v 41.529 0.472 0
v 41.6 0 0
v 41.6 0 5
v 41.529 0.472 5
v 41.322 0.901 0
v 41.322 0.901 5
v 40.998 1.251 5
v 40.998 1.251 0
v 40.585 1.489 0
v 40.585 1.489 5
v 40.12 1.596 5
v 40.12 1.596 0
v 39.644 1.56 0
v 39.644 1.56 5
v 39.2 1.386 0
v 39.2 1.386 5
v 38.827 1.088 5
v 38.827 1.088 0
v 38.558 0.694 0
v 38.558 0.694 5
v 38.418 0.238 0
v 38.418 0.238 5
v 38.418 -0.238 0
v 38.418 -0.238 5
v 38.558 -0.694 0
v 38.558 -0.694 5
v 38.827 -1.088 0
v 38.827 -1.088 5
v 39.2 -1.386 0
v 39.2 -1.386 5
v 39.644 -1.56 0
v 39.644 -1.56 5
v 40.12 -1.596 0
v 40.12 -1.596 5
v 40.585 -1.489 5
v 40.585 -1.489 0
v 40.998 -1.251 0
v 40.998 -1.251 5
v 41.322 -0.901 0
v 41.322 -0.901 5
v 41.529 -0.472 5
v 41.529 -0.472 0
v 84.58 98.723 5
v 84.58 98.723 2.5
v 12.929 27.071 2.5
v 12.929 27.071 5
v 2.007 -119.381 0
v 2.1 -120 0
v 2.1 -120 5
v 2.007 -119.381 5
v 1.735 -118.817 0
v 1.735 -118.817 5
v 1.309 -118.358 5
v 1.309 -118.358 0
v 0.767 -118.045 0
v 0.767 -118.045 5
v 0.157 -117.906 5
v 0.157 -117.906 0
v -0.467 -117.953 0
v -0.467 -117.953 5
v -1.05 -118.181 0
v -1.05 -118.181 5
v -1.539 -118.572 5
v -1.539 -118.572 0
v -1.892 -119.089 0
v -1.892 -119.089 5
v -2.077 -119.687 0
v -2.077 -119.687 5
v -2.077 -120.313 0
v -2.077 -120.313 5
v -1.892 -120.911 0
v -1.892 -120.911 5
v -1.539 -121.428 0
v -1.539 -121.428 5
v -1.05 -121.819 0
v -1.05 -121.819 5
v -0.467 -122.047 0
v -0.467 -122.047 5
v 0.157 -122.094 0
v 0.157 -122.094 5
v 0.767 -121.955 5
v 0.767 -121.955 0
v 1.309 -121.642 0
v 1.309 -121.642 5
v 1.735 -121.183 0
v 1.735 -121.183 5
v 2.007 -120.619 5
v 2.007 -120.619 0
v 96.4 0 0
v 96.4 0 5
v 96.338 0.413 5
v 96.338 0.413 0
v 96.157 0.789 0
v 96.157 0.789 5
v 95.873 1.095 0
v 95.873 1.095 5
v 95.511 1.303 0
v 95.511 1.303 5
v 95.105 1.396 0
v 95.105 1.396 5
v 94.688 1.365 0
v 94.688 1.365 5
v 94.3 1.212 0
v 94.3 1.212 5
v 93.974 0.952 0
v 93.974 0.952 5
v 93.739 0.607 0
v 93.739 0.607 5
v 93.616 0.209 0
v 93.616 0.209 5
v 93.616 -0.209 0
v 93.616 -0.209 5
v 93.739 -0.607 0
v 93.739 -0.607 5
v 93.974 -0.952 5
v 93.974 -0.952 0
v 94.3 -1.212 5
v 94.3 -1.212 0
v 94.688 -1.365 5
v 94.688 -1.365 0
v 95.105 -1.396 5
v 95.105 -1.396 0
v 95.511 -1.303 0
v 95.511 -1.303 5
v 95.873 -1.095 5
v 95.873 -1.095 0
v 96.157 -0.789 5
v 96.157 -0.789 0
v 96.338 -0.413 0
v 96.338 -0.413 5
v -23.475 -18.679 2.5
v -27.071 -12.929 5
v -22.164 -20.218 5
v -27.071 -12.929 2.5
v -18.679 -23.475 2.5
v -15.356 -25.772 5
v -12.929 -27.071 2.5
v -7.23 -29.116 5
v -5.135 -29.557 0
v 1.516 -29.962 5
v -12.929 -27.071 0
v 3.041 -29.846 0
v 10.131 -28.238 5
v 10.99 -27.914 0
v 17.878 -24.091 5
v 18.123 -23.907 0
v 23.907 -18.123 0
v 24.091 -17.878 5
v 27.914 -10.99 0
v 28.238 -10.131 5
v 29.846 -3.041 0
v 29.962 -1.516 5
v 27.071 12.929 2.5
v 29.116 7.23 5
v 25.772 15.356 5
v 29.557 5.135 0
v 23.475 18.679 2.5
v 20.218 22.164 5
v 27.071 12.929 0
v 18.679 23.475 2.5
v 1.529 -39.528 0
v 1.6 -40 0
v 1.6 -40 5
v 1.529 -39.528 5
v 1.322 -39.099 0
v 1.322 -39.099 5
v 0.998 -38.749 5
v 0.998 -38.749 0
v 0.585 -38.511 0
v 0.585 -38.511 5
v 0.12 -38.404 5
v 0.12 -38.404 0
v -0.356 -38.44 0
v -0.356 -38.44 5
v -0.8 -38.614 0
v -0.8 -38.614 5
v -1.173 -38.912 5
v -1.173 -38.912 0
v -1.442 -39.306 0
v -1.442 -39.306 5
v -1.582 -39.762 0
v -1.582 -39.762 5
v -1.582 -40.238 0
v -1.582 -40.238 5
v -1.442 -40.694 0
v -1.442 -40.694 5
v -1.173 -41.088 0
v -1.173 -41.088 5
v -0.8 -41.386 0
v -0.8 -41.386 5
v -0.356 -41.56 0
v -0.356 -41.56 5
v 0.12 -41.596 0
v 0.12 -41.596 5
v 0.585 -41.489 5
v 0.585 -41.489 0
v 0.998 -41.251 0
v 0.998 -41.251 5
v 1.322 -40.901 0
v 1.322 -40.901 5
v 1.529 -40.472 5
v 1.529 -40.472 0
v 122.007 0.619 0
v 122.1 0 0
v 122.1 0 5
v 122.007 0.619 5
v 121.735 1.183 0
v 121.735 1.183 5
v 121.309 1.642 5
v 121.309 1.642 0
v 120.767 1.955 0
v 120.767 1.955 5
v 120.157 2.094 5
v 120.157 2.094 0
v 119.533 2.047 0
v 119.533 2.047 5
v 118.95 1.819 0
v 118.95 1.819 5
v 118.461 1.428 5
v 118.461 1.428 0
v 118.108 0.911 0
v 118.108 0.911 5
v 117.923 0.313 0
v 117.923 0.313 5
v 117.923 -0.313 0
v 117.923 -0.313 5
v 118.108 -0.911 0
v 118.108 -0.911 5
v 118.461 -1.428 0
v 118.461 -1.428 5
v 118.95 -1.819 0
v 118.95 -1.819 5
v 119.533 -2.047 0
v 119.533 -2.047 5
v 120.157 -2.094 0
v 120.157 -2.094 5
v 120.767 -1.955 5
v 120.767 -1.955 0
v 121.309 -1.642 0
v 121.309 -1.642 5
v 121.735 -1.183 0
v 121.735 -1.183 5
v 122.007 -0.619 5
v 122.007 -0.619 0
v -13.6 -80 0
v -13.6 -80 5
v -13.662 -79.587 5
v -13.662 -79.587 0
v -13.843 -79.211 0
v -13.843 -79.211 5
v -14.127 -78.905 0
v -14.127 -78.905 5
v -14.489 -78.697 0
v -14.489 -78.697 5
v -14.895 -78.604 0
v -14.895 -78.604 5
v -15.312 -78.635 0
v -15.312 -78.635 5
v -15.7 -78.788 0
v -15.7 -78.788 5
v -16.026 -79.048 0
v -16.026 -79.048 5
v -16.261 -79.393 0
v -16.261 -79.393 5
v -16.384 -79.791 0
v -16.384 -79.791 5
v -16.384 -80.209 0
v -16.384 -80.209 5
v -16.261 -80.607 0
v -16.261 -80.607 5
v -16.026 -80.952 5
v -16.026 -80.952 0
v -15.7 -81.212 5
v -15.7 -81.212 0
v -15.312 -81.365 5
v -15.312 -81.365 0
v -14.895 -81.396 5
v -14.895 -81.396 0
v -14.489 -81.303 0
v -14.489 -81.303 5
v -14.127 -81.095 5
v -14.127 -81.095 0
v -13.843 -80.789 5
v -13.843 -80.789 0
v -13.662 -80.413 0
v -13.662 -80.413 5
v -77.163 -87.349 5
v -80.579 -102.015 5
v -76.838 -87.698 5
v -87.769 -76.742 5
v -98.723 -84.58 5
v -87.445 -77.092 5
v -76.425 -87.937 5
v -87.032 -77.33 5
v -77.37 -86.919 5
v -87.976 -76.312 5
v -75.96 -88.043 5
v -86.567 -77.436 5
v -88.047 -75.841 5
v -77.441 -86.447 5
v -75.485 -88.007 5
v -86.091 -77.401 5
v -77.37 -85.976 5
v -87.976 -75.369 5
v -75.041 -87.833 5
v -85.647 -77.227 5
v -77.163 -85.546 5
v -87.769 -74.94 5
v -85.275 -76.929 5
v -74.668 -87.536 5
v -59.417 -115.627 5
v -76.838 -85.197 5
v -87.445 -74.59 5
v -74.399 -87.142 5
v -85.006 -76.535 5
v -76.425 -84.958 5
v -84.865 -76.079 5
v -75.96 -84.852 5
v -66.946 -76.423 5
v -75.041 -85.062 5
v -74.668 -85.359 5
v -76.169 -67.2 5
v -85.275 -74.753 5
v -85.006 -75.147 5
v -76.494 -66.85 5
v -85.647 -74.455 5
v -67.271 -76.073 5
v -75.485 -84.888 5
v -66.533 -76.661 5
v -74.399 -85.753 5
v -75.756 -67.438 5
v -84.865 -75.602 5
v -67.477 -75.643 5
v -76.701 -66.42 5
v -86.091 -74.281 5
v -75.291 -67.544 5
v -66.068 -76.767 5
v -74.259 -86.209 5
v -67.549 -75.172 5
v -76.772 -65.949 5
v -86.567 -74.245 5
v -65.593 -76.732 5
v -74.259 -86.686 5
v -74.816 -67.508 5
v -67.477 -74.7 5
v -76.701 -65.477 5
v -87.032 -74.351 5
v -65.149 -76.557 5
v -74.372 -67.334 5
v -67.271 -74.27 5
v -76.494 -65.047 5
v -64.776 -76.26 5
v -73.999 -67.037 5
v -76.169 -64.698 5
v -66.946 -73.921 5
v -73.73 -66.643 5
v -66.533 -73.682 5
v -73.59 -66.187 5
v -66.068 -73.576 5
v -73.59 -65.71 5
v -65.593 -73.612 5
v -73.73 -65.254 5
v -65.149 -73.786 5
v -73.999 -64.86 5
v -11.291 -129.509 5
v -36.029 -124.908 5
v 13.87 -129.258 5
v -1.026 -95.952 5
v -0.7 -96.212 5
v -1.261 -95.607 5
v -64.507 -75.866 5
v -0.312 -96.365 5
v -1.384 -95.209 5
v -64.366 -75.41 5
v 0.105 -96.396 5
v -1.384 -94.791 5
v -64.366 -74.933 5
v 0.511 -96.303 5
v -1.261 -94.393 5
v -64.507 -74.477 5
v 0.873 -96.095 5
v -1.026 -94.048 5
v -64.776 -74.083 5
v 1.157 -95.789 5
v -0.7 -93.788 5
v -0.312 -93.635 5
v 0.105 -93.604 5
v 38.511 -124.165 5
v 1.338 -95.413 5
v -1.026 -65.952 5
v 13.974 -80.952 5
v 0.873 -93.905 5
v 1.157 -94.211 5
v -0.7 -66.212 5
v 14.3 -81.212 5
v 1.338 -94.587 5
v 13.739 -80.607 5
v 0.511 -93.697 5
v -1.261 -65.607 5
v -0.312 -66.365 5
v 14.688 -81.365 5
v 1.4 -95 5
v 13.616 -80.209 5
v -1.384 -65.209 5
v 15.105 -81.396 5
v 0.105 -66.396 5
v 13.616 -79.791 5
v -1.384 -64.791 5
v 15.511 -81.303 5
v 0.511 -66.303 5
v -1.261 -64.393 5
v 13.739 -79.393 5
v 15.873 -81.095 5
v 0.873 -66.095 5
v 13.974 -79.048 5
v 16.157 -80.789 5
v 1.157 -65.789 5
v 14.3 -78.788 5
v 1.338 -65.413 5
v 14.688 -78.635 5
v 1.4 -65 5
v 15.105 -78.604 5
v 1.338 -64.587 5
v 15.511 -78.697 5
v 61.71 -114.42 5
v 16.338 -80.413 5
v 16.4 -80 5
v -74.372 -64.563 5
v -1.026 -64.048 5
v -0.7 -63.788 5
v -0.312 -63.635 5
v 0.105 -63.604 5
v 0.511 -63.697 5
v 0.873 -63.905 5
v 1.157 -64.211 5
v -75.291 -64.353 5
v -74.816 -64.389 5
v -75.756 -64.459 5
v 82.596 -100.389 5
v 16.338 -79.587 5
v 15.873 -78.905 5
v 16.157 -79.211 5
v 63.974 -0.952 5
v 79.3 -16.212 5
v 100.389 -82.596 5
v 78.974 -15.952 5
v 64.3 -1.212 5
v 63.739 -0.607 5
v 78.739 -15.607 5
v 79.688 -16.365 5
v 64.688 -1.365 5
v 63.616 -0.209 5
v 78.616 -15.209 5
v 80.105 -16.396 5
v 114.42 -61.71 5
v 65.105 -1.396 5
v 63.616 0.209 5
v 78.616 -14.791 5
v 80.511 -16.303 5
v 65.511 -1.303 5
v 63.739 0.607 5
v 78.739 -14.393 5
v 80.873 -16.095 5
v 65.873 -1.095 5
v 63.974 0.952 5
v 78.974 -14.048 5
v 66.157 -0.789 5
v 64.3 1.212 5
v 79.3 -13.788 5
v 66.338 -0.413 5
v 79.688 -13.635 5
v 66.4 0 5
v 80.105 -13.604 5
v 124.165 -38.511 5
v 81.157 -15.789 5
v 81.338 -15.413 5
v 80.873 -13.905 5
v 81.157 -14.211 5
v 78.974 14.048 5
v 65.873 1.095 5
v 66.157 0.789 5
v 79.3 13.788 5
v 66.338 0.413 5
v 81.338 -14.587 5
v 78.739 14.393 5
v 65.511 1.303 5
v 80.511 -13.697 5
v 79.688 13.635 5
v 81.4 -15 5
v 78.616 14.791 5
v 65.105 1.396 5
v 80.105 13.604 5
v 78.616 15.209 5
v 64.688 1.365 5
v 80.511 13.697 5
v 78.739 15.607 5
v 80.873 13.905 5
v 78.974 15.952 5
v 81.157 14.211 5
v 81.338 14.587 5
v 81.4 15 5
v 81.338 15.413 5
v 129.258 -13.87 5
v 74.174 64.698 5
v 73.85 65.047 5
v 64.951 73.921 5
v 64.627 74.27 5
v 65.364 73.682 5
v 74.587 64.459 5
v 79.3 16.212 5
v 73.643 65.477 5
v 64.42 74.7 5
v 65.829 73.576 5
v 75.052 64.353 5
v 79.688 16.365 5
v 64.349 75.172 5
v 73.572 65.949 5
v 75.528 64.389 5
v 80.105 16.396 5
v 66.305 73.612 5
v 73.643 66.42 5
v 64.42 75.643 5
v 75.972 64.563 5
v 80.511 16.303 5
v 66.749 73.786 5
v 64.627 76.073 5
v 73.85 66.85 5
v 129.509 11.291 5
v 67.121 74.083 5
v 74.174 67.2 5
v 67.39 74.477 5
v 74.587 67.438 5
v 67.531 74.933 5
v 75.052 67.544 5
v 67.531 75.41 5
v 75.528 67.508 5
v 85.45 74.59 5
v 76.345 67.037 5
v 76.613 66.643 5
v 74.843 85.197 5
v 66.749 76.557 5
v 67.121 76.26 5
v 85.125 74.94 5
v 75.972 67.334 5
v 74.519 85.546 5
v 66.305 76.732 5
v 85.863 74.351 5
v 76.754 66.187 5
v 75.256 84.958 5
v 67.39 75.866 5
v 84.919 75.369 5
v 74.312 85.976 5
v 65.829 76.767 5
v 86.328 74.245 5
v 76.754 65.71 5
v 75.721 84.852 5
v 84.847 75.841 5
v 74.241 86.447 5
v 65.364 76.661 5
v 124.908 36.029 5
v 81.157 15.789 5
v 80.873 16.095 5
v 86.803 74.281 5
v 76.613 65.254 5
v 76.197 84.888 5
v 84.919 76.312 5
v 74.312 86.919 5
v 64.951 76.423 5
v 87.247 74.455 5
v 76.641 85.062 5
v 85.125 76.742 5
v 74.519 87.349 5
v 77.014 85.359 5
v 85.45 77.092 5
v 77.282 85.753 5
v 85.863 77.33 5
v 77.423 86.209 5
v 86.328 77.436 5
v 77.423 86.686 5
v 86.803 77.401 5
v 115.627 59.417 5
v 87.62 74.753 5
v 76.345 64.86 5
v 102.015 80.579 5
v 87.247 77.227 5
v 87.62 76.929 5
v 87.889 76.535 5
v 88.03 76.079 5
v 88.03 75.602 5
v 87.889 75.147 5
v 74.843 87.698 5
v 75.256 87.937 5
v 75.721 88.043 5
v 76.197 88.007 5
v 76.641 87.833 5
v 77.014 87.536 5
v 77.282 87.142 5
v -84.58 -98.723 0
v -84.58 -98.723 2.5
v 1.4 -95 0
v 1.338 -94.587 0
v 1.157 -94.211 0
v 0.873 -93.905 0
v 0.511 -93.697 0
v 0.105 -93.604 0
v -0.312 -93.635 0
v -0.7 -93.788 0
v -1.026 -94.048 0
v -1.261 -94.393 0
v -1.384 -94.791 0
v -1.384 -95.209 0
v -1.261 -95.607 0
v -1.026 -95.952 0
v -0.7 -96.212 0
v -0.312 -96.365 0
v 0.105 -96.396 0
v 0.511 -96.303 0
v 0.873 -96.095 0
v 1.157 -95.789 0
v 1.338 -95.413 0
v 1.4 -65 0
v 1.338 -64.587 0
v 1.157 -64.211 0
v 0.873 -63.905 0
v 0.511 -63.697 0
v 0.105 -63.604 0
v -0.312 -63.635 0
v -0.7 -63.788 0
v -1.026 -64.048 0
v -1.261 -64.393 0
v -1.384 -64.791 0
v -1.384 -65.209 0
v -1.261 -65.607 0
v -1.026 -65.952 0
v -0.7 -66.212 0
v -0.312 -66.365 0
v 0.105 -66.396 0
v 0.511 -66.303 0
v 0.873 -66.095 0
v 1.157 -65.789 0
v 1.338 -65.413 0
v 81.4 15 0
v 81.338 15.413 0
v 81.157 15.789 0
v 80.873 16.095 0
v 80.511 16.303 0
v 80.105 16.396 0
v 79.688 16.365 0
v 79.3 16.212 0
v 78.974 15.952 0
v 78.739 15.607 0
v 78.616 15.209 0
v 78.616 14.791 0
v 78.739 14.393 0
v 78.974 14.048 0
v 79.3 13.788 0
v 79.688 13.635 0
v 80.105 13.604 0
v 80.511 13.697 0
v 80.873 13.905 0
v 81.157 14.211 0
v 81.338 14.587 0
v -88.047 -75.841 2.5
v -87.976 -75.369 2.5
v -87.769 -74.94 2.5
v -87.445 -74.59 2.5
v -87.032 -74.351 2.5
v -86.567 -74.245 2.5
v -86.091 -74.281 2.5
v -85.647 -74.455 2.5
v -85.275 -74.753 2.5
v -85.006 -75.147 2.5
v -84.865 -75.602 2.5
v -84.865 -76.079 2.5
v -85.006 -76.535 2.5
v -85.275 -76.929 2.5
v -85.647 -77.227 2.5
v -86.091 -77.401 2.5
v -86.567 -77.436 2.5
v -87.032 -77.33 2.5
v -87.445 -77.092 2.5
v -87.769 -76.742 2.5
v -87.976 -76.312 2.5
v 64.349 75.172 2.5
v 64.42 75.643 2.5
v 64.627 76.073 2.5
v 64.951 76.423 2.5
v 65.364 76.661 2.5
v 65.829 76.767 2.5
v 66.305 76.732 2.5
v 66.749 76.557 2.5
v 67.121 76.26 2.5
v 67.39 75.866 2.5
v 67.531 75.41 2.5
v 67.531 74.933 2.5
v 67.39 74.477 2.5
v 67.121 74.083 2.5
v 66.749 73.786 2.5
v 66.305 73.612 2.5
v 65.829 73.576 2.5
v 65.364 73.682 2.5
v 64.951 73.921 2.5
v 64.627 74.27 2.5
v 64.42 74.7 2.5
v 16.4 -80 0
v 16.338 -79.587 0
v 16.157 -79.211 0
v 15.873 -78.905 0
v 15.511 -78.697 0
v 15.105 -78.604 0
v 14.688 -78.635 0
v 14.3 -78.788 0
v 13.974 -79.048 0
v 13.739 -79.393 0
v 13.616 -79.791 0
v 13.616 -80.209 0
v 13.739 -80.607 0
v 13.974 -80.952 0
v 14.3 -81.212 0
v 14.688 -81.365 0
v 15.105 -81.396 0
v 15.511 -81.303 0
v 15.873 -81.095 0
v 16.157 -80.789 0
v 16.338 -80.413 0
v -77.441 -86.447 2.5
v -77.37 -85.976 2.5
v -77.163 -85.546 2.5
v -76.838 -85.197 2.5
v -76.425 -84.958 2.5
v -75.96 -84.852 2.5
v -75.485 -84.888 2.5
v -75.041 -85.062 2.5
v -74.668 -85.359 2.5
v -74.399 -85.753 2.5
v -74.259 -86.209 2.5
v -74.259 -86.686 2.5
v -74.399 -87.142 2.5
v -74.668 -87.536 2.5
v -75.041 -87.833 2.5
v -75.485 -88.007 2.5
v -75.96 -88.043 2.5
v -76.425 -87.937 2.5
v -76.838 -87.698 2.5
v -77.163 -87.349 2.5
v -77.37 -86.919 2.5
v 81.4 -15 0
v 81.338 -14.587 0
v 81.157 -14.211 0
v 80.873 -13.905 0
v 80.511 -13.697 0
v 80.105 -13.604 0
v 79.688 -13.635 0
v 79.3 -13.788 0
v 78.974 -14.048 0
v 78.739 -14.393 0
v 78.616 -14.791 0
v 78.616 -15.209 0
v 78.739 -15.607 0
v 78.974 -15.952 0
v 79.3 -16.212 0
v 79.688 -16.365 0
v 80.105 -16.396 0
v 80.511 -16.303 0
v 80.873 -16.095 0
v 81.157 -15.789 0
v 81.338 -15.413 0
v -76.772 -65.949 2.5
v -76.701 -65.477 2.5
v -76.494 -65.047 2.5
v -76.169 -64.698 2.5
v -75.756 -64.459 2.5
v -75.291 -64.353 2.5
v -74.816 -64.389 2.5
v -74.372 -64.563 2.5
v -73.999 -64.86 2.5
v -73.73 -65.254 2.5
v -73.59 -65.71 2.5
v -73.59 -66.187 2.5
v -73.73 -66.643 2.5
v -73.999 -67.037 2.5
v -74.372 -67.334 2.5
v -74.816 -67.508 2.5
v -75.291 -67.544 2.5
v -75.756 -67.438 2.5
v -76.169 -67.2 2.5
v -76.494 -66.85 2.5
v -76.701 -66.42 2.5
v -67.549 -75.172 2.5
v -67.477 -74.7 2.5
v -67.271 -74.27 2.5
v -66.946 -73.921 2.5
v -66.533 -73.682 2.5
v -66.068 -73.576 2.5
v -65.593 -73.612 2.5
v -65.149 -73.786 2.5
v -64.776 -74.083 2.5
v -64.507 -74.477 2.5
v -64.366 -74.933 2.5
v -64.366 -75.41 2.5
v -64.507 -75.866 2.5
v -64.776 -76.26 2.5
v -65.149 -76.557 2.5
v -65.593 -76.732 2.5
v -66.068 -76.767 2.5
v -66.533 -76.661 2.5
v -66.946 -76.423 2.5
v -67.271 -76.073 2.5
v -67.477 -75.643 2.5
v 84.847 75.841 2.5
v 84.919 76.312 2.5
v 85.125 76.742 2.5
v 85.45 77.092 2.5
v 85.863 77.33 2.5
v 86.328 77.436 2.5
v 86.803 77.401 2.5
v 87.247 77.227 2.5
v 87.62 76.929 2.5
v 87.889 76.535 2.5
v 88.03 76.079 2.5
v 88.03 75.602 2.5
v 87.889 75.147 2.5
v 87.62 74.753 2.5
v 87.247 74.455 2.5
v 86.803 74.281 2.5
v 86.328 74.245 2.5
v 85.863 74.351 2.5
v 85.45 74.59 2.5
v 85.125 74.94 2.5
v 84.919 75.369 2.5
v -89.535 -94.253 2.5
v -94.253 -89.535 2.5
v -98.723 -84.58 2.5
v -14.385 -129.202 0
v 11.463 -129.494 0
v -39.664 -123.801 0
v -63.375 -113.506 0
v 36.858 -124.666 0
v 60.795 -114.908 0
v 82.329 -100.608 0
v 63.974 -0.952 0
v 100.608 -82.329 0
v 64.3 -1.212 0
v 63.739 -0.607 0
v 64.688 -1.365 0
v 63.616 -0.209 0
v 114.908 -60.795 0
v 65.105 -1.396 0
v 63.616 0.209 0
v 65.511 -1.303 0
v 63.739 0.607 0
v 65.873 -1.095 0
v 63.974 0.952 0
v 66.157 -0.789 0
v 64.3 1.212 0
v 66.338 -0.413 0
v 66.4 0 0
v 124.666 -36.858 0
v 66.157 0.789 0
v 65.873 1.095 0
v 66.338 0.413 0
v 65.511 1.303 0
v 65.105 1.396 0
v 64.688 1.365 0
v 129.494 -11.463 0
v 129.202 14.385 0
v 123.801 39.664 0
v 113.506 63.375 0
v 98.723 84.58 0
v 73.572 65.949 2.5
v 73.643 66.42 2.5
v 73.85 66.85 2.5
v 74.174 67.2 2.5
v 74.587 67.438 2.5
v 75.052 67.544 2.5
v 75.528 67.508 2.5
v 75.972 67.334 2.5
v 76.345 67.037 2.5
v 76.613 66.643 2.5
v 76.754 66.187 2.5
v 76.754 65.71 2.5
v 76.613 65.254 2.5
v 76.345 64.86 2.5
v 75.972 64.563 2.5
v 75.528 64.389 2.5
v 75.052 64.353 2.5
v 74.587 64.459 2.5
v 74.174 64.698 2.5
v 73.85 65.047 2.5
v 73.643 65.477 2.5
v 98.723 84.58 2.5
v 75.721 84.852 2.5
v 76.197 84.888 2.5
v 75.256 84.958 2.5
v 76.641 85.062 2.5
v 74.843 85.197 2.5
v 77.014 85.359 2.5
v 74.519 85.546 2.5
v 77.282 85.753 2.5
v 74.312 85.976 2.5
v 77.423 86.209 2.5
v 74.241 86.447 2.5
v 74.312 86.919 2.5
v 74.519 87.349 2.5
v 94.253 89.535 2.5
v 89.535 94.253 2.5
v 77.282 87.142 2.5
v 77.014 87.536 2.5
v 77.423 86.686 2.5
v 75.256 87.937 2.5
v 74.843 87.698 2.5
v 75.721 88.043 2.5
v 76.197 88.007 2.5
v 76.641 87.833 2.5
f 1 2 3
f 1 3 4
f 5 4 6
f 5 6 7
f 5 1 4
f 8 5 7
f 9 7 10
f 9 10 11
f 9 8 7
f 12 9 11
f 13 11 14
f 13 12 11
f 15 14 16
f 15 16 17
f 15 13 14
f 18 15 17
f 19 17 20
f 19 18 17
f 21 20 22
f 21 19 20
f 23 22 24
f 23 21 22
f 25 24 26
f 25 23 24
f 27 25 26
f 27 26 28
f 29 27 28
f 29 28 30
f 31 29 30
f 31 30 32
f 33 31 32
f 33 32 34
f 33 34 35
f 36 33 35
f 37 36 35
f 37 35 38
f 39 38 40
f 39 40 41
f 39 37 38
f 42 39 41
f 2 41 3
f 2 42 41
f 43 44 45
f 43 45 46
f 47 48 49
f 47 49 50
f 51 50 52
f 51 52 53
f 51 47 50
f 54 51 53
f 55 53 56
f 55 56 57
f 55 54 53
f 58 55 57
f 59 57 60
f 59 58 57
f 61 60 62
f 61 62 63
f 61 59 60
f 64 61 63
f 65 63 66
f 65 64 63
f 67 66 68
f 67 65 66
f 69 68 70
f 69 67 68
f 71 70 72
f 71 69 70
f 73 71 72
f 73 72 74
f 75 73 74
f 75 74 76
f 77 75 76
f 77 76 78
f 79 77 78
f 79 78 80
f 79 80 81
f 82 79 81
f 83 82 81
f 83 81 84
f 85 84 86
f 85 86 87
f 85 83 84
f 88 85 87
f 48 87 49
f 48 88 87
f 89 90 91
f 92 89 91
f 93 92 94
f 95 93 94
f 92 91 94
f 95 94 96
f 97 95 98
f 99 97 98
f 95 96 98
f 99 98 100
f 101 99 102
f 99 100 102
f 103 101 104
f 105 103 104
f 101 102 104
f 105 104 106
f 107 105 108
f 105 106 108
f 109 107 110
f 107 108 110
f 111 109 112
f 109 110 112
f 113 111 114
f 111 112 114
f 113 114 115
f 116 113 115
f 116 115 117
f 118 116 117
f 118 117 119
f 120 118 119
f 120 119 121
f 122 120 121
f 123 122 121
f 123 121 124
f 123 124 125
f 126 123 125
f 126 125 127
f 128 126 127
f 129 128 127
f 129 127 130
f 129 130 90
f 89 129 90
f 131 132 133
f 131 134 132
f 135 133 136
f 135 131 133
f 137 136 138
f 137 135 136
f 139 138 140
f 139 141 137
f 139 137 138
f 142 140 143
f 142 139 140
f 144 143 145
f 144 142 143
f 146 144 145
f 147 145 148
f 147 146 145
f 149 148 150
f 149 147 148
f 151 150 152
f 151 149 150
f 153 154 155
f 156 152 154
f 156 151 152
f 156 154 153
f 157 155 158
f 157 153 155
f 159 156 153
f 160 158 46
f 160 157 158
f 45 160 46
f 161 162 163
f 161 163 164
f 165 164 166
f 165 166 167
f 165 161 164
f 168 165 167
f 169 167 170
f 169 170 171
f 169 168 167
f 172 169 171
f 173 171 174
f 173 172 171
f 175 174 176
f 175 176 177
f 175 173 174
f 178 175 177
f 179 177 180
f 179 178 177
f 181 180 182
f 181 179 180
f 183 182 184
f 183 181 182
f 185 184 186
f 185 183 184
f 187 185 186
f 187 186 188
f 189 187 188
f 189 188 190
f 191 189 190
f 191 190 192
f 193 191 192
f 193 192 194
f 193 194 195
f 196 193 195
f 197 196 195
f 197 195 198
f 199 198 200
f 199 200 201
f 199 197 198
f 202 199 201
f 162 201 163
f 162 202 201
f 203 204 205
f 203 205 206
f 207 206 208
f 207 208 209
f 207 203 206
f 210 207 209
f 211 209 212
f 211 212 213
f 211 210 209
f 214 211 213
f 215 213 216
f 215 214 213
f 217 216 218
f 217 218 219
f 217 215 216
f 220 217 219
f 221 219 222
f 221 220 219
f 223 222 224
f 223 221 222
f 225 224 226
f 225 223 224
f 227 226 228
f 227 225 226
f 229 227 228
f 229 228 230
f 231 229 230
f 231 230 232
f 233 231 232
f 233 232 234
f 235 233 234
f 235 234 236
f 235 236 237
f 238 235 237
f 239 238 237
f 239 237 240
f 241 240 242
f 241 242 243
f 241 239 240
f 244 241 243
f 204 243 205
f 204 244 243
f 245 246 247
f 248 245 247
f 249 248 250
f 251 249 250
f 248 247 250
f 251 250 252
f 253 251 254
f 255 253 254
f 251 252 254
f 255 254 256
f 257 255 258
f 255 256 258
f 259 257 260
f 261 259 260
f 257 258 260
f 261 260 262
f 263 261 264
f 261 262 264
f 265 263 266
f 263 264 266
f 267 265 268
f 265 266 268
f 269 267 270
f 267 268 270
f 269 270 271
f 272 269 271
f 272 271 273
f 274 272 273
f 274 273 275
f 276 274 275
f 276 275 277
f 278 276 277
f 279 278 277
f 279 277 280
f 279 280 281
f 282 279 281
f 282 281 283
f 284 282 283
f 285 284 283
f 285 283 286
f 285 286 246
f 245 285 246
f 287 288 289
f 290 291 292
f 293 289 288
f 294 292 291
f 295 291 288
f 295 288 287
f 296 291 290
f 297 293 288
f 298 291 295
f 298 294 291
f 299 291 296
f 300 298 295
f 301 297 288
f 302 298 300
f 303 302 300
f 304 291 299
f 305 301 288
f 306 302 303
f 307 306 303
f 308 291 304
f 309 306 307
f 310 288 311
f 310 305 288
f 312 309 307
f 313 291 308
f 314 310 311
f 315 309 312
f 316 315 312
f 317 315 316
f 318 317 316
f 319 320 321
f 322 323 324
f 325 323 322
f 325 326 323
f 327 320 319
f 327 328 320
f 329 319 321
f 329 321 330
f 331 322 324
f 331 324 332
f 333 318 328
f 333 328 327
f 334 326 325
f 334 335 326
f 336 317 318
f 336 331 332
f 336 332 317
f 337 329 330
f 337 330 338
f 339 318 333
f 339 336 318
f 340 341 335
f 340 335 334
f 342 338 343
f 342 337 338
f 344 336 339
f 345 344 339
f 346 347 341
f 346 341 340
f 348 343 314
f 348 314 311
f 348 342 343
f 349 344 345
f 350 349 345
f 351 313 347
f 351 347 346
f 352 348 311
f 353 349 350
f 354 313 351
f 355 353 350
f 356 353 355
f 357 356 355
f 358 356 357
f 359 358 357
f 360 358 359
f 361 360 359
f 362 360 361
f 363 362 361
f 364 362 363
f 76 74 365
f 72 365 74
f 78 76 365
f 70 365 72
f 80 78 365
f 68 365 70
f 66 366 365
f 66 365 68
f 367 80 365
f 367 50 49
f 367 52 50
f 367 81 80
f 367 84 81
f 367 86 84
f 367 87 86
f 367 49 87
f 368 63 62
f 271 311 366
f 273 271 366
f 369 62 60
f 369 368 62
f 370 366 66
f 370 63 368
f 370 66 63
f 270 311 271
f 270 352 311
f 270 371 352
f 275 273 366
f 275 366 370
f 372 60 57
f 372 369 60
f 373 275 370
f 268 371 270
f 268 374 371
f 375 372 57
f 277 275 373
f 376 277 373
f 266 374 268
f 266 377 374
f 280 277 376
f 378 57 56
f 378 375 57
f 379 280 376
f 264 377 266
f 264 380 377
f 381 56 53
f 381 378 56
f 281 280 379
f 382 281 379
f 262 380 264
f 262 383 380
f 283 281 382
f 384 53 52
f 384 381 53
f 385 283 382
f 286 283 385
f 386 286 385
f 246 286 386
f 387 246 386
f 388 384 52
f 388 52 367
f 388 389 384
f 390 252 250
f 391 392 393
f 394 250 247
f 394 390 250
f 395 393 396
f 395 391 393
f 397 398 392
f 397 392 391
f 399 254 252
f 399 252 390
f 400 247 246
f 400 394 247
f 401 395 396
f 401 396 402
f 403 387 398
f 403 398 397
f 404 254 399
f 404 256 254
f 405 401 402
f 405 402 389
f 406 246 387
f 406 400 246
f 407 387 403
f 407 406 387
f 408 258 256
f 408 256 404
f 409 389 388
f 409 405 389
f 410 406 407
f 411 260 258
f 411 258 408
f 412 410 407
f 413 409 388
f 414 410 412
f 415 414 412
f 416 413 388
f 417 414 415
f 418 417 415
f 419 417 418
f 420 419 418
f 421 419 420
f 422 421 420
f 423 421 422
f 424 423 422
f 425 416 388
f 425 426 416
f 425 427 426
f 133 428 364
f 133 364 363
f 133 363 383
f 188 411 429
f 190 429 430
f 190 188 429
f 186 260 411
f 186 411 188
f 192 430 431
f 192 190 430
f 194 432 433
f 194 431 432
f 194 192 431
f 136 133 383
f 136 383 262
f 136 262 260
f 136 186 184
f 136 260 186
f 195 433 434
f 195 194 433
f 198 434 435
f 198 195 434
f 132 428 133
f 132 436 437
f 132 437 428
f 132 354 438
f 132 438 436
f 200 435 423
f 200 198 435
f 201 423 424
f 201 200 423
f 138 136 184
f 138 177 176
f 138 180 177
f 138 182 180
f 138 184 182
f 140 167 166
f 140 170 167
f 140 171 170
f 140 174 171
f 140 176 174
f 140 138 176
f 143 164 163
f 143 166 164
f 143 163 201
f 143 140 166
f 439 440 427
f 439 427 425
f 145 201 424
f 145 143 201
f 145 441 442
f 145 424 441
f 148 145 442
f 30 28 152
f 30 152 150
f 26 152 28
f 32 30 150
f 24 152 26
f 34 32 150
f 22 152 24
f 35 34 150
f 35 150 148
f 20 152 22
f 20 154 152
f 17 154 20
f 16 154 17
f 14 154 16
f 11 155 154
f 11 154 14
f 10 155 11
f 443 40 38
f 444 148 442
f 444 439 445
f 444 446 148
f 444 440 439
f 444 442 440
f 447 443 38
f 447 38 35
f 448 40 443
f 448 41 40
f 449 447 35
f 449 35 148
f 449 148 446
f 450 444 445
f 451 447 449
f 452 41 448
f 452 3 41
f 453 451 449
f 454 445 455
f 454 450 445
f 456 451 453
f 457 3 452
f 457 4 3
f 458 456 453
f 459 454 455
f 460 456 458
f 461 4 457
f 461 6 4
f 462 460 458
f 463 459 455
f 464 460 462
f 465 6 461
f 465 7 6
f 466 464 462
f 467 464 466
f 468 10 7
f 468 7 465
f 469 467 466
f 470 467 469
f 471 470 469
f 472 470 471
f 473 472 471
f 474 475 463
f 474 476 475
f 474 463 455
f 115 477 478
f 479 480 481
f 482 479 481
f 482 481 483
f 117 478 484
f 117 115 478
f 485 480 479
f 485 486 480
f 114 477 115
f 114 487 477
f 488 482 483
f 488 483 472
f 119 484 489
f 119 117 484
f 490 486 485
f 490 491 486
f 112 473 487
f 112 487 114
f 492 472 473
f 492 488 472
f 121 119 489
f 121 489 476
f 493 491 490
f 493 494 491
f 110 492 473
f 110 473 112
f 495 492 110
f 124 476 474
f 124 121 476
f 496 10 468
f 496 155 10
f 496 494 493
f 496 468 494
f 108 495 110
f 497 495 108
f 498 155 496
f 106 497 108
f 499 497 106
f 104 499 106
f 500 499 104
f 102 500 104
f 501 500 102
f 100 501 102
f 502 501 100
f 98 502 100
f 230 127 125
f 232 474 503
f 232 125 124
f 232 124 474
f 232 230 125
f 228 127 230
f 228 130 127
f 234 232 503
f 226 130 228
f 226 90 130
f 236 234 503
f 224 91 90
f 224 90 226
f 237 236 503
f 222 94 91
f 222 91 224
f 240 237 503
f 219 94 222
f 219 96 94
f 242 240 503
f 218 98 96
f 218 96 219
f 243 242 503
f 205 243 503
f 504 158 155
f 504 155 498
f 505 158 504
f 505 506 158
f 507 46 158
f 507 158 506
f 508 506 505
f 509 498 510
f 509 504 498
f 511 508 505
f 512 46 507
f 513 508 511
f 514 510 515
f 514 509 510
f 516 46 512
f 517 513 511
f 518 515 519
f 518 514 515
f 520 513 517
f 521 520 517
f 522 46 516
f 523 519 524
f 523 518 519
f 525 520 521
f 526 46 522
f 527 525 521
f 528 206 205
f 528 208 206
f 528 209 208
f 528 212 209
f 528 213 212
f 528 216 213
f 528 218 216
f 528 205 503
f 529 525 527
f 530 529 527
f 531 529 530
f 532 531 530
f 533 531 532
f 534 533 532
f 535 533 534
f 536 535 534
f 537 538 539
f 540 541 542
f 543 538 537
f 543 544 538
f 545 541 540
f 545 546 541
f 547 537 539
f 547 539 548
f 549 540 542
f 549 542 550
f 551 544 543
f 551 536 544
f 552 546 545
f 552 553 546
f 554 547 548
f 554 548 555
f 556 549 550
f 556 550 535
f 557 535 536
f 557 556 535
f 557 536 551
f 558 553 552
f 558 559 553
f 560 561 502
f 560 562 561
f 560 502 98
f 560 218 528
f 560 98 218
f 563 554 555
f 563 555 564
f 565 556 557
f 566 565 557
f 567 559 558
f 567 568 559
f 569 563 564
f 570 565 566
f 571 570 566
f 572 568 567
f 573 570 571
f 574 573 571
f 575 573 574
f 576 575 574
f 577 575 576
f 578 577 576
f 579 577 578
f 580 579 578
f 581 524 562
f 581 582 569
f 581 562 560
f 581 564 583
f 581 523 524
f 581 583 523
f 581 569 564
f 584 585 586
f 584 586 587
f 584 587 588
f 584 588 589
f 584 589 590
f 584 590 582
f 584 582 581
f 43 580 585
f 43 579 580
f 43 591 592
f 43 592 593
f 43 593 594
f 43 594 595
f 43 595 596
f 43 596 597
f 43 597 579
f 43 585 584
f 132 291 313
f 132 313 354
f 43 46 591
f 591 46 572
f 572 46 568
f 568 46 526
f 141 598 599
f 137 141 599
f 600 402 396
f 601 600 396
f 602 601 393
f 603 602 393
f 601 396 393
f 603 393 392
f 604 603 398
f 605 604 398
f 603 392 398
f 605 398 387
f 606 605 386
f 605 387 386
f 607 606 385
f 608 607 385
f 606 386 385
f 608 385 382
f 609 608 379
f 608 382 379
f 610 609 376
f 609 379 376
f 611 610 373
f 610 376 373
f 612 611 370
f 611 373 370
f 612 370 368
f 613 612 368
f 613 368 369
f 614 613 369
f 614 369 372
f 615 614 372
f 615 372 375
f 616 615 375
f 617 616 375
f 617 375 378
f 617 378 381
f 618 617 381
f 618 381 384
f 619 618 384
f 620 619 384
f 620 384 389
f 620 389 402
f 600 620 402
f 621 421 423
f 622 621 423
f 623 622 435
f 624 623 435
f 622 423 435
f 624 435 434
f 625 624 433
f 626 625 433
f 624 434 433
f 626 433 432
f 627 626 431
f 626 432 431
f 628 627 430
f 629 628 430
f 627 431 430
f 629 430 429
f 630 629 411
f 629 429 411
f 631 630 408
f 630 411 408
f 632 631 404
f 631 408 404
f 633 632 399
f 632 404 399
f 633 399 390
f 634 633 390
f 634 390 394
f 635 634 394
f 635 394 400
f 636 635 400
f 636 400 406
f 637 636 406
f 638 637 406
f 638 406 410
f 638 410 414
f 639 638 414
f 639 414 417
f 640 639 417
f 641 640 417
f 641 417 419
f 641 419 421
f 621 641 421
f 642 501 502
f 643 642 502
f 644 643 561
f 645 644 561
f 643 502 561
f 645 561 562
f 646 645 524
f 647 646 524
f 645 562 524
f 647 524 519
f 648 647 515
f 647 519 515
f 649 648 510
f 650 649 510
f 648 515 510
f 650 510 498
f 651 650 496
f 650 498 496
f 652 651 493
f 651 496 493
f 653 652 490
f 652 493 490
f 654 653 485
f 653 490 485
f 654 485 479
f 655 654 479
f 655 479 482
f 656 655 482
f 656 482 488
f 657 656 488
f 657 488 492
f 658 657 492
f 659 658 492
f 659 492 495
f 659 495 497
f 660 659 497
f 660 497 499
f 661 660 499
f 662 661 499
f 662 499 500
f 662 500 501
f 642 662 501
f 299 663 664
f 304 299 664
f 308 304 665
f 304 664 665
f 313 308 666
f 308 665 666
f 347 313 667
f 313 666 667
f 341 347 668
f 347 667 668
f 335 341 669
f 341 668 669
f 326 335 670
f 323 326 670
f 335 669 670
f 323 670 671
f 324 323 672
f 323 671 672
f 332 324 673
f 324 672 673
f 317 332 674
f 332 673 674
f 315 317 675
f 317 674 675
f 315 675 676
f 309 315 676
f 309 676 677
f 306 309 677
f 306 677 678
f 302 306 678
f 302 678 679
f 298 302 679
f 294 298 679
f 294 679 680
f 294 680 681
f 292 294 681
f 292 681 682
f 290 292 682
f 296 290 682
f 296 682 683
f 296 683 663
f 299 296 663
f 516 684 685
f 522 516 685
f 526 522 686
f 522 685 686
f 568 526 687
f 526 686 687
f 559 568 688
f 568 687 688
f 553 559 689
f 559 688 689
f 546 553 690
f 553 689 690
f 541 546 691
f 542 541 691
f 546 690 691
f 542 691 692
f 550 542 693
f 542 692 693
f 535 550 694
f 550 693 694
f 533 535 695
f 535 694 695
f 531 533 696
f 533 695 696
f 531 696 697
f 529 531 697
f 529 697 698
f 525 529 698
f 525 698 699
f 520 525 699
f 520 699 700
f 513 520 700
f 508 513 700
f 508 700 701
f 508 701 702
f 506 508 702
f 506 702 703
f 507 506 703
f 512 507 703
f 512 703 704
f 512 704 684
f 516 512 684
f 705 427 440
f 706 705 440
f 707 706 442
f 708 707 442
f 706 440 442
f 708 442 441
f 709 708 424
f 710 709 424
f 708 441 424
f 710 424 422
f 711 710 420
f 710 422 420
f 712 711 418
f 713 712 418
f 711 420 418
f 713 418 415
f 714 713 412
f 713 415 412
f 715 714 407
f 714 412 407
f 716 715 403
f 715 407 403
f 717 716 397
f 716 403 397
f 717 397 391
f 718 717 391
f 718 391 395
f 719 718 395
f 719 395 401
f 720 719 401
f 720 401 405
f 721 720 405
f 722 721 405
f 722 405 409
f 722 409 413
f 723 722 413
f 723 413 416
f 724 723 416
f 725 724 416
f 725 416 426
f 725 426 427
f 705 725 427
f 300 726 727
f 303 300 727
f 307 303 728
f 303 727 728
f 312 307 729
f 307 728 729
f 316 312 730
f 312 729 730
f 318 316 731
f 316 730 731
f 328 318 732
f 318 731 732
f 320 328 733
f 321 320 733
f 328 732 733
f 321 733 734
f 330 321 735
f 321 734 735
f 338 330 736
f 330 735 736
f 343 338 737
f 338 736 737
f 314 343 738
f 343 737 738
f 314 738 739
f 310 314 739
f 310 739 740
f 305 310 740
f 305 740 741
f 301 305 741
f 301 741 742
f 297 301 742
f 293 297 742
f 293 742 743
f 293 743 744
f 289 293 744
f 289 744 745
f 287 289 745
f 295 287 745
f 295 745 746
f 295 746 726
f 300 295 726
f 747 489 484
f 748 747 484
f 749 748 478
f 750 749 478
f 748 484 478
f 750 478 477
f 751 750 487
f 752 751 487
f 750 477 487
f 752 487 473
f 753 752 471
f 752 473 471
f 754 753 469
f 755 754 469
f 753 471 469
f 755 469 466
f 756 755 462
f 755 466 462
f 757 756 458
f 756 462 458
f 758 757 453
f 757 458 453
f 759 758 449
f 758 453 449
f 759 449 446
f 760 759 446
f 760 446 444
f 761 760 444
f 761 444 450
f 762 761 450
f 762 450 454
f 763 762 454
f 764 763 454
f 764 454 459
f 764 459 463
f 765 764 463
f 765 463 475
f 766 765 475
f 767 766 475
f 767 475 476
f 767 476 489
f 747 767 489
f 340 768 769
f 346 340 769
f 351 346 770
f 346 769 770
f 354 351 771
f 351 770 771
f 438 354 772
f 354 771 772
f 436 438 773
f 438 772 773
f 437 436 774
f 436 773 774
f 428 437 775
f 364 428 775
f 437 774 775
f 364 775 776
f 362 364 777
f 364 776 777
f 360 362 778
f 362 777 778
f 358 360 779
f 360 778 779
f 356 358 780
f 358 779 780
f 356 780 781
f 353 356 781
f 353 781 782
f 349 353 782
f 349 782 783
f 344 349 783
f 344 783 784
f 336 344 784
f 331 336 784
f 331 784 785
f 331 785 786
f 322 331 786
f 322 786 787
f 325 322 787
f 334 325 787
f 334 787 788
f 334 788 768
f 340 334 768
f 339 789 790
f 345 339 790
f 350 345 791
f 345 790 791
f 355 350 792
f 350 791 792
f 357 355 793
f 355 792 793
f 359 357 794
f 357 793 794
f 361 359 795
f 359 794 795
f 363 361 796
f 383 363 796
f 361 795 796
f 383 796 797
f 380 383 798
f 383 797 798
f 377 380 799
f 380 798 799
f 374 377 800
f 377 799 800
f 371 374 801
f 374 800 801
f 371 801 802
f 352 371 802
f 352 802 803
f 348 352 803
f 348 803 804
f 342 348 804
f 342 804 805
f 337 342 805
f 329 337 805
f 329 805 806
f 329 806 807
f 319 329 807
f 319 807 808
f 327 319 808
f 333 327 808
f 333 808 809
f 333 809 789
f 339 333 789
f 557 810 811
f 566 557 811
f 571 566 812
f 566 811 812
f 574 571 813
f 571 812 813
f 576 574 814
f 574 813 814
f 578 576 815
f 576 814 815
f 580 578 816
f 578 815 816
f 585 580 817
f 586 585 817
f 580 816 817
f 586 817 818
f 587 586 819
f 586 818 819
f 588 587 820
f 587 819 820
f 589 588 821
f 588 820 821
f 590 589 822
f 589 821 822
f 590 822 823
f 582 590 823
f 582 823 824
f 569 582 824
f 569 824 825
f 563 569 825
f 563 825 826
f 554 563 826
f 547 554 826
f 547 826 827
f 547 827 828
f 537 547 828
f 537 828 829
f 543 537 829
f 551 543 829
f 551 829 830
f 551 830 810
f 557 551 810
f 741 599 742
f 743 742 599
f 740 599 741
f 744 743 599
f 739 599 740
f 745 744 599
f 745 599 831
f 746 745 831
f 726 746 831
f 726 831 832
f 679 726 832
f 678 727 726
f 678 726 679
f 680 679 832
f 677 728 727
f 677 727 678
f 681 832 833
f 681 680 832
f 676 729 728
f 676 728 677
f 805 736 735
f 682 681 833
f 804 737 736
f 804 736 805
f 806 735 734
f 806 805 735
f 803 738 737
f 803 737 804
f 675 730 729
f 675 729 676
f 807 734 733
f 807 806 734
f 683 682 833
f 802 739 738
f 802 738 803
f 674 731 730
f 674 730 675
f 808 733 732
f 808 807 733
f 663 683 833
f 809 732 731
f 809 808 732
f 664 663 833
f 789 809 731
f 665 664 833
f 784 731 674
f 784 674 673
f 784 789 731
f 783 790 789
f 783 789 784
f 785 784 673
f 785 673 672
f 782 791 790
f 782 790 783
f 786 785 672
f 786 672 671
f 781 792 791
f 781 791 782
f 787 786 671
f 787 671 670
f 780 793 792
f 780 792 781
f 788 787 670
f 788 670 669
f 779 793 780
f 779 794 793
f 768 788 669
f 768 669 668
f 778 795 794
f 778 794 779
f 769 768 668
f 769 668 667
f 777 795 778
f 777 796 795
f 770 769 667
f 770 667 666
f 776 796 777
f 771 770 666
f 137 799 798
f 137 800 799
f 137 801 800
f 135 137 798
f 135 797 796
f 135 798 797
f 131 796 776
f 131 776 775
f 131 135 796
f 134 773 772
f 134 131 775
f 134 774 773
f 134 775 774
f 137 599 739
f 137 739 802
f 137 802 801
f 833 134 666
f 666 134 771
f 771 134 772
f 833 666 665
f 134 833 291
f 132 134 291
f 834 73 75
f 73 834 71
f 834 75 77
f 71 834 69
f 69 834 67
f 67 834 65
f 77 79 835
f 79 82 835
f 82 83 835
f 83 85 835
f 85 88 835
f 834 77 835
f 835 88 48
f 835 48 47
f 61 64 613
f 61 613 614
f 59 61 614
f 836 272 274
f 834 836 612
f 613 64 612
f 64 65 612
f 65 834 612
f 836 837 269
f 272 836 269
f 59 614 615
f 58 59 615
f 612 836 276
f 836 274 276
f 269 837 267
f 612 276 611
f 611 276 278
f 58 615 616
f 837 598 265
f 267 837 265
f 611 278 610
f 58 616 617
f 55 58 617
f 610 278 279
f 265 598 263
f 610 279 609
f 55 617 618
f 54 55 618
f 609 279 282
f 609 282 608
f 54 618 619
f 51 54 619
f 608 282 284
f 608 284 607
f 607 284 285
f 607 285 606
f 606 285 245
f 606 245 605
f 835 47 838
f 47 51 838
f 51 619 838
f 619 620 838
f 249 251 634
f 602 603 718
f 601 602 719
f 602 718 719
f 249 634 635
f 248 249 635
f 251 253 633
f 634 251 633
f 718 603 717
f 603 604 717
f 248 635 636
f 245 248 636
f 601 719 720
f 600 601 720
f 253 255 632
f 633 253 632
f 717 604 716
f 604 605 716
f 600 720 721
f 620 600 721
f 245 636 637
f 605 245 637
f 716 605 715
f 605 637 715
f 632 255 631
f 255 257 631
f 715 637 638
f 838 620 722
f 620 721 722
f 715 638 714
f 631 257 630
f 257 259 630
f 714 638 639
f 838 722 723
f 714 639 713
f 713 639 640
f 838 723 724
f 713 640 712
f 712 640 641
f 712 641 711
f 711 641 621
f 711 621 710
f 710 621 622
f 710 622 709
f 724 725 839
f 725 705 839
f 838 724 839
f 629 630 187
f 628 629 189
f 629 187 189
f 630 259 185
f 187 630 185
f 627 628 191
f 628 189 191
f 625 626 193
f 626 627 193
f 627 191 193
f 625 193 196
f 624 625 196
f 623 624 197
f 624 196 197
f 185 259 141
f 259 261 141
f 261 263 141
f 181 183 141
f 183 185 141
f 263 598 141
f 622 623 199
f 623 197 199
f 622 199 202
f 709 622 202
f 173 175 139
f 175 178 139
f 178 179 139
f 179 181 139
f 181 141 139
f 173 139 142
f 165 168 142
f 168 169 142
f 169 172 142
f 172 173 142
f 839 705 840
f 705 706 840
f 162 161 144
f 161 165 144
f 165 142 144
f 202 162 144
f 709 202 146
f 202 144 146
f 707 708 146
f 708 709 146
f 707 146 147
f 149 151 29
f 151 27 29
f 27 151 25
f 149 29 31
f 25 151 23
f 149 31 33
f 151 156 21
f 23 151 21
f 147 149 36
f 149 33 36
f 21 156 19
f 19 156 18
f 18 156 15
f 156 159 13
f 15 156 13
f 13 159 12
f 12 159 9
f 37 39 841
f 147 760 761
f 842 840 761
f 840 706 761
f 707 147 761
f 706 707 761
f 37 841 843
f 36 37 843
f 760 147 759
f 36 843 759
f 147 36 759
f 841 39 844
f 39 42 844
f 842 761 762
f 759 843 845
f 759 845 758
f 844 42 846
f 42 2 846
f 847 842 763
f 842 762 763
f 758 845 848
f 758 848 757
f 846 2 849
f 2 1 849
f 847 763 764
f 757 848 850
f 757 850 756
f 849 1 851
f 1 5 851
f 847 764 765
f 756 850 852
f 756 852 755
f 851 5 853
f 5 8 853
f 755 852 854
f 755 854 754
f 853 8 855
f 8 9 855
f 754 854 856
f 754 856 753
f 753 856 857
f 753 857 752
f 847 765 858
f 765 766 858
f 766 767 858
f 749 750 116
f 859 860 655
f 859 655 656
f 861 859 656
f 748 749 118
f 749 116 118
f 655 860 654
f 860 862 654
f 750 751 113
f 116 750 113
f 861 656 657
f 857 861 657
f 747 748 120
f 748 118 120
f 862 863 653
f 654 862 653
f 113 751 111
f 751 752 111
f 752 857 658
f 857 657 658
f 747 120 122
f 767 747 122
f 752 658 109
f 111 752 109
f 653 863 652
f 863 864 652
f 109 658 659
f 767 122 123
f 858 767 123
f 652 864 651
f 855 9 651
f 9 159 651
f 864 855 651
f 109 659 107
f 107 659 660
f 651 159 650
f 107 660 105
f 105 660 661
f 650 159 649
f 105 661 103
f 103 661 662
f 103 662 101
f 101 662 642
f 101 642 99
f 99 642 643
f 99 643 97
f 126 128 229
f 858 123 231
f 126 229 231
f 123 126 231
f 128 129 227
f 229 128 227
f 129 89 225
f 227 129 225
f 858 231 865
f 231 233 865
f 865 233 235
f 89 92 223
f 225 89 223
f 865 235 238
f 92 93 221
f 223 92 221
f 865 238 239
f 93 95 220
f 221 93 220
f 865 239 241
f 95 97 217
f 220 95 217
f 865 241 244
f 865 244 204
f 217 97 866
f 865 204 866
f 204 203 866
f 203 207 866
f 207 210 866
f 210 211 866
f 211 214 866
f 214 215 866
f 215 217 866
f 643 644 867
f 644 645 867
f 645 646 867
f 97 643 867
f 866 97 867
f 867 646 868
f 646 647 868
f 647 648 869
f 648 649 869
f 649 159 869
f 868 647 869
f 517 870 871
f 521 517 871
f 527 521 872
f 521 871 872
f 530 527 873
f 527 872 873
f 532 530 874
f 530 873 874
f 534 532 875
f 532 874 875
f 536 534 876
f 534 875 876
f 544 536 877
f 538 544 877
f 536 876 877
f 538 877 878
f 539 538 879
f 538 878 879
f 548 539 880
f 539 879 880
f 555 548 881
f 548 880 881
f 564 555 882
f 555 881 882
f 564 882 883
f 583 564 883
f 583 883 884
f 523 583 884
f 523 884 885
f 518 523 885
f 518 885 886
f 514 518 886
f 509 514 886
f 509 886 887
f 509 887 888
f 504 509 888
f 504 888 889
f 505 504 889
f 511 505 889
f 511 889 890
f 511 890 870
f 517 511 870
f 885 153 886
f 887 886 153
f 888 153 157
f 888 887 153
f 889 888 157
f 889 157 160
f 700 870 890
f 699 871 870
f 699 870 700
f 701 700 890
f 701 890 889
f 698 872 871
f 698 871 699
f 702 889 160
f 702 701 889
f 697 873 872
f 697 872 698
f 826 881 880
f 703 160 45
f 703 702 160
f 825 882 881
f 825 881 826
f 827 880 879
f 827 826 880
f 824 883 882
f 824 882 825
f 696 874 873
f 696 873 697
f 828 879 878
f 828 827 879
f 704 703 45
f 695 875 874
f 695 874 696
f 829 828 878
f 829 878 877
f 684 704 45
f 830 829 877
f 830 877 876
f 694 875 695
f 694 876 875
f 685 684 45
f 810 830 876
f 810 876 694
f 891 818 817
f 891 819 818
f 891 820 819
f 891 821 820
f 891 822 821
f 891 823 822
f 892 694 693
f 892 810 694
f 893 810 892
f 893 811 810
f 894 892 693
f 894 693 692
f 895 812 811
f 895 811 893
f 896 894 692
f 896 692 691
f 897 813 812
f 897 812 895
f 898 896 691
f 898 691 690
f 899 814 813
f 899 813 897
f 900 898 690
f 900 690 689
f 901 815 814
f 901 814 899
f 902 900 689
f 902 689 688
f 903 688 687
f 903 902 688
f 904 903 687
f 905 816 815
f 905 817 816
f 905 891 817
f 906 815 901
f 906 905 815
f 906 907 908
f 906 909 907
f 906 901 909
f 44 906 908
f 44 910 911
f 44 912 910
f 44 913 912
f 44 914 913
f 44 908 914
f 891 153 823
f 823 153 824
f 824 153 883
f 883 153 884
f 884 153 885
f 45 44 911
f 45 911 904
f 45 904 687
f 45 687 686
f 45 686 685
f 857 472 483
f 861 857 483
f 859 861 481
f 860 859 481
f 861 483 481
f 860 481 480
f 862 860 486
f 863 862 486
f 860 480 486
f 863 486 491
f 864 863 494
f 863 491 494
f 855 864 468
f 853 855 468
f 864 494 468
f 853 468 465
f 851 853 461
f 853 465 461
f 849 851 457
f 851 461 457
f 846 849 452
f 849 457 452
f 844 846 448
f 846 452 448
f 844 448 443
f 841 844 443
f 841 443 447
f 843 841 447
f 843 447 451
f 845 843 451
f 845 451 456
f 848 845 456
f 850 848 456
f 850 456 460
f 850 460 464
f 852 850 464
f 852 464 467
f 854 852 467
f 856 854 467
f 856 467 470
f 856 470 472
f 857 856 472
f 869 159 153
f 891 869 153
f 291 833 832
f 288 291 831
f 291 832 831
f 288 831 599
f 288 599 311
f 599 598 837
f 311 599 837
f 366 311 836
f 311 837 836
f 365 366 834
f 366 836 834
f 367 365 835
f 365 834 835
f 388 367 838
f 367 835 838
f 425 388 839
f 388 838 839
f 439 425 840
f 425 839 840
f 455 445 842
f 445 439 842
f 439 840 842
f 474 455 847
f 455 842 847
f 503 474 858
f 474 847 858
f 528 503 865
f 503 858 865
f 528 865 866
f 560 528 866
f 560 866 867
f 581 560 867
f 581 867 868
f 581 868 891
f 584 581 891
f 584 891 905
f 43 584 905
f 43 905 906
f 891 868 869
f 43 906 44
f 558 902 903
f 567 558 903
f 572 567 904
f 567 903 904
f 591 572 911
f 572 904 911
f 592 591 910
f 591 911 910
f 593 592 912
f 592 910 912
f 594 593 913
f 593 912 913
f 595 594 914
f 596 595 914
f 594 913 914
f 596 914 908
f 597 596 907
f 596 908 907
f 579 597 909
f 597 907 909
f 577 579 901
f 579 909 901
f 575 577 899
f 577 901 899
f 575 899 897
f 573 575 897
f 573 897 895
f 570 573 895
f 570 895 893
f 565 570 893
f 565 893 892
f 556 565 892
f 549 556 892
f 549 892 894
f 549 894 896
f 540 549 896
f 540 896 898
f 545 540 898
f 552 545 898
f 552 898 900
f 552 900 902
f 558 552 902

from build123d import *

# Parameters (mm, degrees)
SKETCH_1_R               = 130
SKETCH_1_R_2             = 30
SKETCH_1_R_3             = 2.1
SKETCH_1_R_4             = 1.6
EXTRUDE_1_DEPTH          = 5
SKETCH_2_R               = 1.4
CUT_EXTRUDE_1_DEPTH      = 1
CUT_EXTRUDE_1_DEPTH_BACK = 6
CUT_EXTRUDE_2_REACH      = 7
SKETCH_8_R               = 1.6
CUT_EXTRUDE_3_DEPTH      = 314.847763109


with BuildPart() as part:
    # 草图1 → 凸台-拉伸1 (new body)
    with BuildSketch(Plane.XY):
        Circle(SKETCH_1_R)
        Circle(SKETCH_1_R_2, mode=Mode.SUBTRACT)
        with Locations((0, 120)):
            Circle(SKETCH_1_R_3, mode=Mode.SUBTRACT)
        with Locations((120, 0)):
            Circle(SKETCH_1_R_3, mode=Mode.SUBTRACT)
        with Locations((0, -120)):
            Circle(SKETCH_1_R_3, mode=Mode.SUBTRACT)
        with Locations((-120, 0)):
            Circle(SKETCH_1_R_3, mode=Mode.SUBTRACT)
        with Locations((0, 40)):
            Circle(SKETCH_1_R_4, mode=Mode.SUBTRACT)
        with Locations((40, 0)):
            Circle(SKETCH_1_R_4, mode=Mode.SUBTRACT)
        with Locations((0, -40)):
            Circle(SKETCH_1_R_4, mode=Mode.SUBTRACT)
        with Locations((-40, 0)):
            Circle(SKETCH_1_R_4, mode=Mode.SUBTRACT)
    extrude(amount=EXTRUDE_1_DEPTH)

    # 草图2 → 切除-拉伸1 (cut, two sides)
    with BuildSketch(Plane.XY.offset(5)) as cut_extrude_1_sk:
        with Locations((0, 95)):
            Circle(SKETCH_2_R)
        with Locations((15, 80)):
            Circle(SKETCH_2_R)
        with Locations((0, 65)):
            Circle(SKETCH_2_R)
        with Locations((-15, 80)):
            Circle(SKETCH_2_R)
        with Locations((95, 0)):
            Circle(SKETCH_2_R)
        with Locations((80, -15)):
            Circle(SKETCH_2_R)
        with Locations((65, 0)):
            Circle(SKETCH_2_R)
        with Locations((80, 15)):
            Circle(SKETCH_2_R)
        with Locations((0, -95)):
            Circle(SKETCH_2_R)
        with Locations((-15, -80)):
            Circle(SKETCH_2_R)
        with Locations((0, -65)):
            Circle(SKETCH_2_R)
        with Locations((15, -80)):
            Circle(SKETCH_2_R)
        with Locations((-95, 0)):
            Circle(SKETCH_2_R)
        with Locations((-80, 15)):
            Circle(SKETCH_2_R)
        with Locations((-65, 0)):
            Circle(SKETCH_2_R)
        with Locations((-80, -15)):
            Circle(SKETCH_2_R)
    extrude(amount=CUT_EXTRUDE_1_DEPTH, mode=Mode.SUBTRACT)
    extrude(cut_extrude_1_sk.sketch, amount=-CUT_EXTRUDE_1_DEPTH_BACK, mode=Mode.SUBTRACT)

    # 草图8 → 切除-拉伸2 (cut, up to next)
    with BuildSketch(Plane(origin=(0, 0, 0), x_dir=(-1, 0, 0), z_dir=(0, 0, -1)), mode=Mode.PRIVATE) as cut_extrude_2_sk1:
        with Locations((-75.840860977, 86.447462694)):
            Circle(SKETCH_8_R)
    cut_extrude_2_tool1 = extrude(cut_extrude_2_sk1.sketch, amount=-CUT_EXTRUDE_2_REACH, mode=Mode.PRIVATE) & part.part
    add(cut_extrude_2_tool1.solids().sort_by_distance((75.840861, 86.447463, 0))[0], mode=Mode.SUBTRACT)
    # 草图8 → 切除-拉伸2 (cut, up to next)
    with BuildSketch(Plane(origin=(0, 0, 0), x_dir=(-1, 0, 0), z_dir=(0, 0, -1)), mode=Mode.PRIVATE) as cut_extrude_2_sk2:
        with Locations((-86.447462694, 75.840860977)):
            Circle(SKETCH_8_R)
    cut_extrude_2_tool2 = extrude(cut_extrude_2_sk2.sketch, amount=-CUT_EXTRUDE_2_REACH, mode=Mode.PRIVATE) & part.part
    add(cut_extrude_2_tool2.solids().sort_by_distance((86.447463, 75.840861, 0))[0], mode=Mode.SUBTRACT)
    # 草图8 → 切除-拉伸2 (cut, up to next)
    with BuildSketch(Plane(origin=(0, 0, 0), x_dir=(-1, 0, 0), z_dir=(0, 0, -1)), mode=Mode.PRIVATE) as cut_extrude_2_sk3:
        with Locations((-65.948574762, 75.171706691)):
            Circle(SKETCH_8_R)
    cut_extrude_2_tool3 = extrude(cut_extrude_2_sk3.sketch, amount=-CUT_EXTRUDE_2_REACH, mode=Mode.PRIVATE) & part.part
    add(cut_extrude_2_tool3.solids().sort_by_distance((65.948575, 75.171707, 0))[0], mode=Mode.SUBTRACT)
    # 草图8 → 切除-拉伸2 (cut, up to next)
    with BuildSketch(Plane(origin=(0, 0, 0), x_dir=(-1, 0, 0), z_dir=(0, 0, -1)), mode=Mode.PRIVATE) as cut_extrude_2_sk4:
        with Locations((-75.171706691, 65.948574762)):
            Circle(SKETCH_8_R)
    cut_extrude_2_tool4 = extrude(cut_extrude_2_sk4.sketch, amount=-CUT_EXTRUDE_2_REACH, mode=Mode.PRIVATE) & part.part
    add(cut_extrude_2_tool4.solids().sort_by_distance((75.171707, 65.948575, 0))[0], mode=Mode.SUBTRACT)
    # 草图8 → 切除-拉伸2 (cut, up to next)
    with BuildSketch(Plane(origin=(0, 0, 0), x_dir=(-1, 0, 0), z_dir=(0, 0, -1)), mode=Mode.PRIVATE) as cut_extrude_2_sk5:
        with Locations((65.948574762, -75.171706691)):
            Circle(SKETCH_8_R)
    cut_extrude_2_tool5 = extrude(cut_extrude_2_sk5.sketch, amount=-CUT_EXTRUDE_2_REACH, mode=Mode.PRIVATE) & part.part
    add(cut_extrude_2_tool5.solids().sort_by_distance((-65.948575, -75.171707, 0))[0], mode=Mode.SUBTRACT)
    # 草图8 → 切除-拉伸2 (cut, up to next)
    with BuildSketch(Plane(origin=(0, 0, 0), x_dir=(-1, 0, 0), z_dir=(0, 0, -1)), mode=Mode.PRIVATE) as cut_extrude_2_sk6:
        with Locations((75.171706691, -65.948574762)):
            Circle(SKETCH_8_R)
    cut_extrude_2_tool6 = extrude(cut_extrude_2_sk6.sketch, amount=-CUT_EXTRUDE_2_REACH, mode=Mode.PRIVATE) & part.part
    add(cut_extrude_2_tool6.solids().sort_by_distance((-75.171707, -65.948575, 0))[0], mode=Mode.SUBTRACT)
    # 草图8 → 切除-拉伸2 (cut, up to next)
    with BuildSketch(Plane(origin=(0, 0, 0), x_dir=(-1, 0, 0), z_dir=(0, 0, -1)), mode=Mode.PRIVATE) as cut_extrude_2_sk7:
        with Locations((75.840860977, -86.447462694)):
            Circle(SKETCH_8_R)
    cut_extrude_2_tool7 = extrude(cut_extrude_2_sk7.sketch, amount=-CUT_EXTRUDE_2_REACH, mode=Mode.PRIVATE) & part.part
    add(cut_extrude_2_tool7.solids().sort_by_distance((-75.840861, -86.447463, 0))[0], mode=Mode.SUBTRACT)
    # 草图8 → 切除-拉伸2 (cut, up to next)
    with BuildSketch(Plane(origin=(0, 0, 0), x_dir=(-1, 0, 0), z_dir=(0, 0, -1)), mode=Mode.PRIVATE) as cut_extrude_2_sk8:
        with Locations((86.447462694, -75.840860977)):
            Circle(SKETCH_8_R)
    cut_extrude_2_tool8 = extrude(cut_extrude_2_sk8.sketch, amount=-CUT_EXTRUDE_2_REACH, mode=Mode.PRIVATE) & part.part
    add(cut_extrude_2_tool8.solids().sort_by_distance((-86.447463, -75.840861, 0))[0], mode=Mode.SUBTRACT)

    # 草图5 → 切除-拉伸3 (cut, through all)
    with BuildSketch(Plane(origin=(91.923881554, 91.923881554, 0), x_dir=(0, 0, -1), z_dir=(0.707106781, 0.707106781, 0))):
        Polygon((0, -10), (-2.5, -10), (-2.5, 10), (-5, 10), (-5, 130), (0, 130), align=None)
    extrude(amount=-CUT_EXTRUDE_3_DEPTH, mode=Mode.SUBTRACT)


solid = part.part
